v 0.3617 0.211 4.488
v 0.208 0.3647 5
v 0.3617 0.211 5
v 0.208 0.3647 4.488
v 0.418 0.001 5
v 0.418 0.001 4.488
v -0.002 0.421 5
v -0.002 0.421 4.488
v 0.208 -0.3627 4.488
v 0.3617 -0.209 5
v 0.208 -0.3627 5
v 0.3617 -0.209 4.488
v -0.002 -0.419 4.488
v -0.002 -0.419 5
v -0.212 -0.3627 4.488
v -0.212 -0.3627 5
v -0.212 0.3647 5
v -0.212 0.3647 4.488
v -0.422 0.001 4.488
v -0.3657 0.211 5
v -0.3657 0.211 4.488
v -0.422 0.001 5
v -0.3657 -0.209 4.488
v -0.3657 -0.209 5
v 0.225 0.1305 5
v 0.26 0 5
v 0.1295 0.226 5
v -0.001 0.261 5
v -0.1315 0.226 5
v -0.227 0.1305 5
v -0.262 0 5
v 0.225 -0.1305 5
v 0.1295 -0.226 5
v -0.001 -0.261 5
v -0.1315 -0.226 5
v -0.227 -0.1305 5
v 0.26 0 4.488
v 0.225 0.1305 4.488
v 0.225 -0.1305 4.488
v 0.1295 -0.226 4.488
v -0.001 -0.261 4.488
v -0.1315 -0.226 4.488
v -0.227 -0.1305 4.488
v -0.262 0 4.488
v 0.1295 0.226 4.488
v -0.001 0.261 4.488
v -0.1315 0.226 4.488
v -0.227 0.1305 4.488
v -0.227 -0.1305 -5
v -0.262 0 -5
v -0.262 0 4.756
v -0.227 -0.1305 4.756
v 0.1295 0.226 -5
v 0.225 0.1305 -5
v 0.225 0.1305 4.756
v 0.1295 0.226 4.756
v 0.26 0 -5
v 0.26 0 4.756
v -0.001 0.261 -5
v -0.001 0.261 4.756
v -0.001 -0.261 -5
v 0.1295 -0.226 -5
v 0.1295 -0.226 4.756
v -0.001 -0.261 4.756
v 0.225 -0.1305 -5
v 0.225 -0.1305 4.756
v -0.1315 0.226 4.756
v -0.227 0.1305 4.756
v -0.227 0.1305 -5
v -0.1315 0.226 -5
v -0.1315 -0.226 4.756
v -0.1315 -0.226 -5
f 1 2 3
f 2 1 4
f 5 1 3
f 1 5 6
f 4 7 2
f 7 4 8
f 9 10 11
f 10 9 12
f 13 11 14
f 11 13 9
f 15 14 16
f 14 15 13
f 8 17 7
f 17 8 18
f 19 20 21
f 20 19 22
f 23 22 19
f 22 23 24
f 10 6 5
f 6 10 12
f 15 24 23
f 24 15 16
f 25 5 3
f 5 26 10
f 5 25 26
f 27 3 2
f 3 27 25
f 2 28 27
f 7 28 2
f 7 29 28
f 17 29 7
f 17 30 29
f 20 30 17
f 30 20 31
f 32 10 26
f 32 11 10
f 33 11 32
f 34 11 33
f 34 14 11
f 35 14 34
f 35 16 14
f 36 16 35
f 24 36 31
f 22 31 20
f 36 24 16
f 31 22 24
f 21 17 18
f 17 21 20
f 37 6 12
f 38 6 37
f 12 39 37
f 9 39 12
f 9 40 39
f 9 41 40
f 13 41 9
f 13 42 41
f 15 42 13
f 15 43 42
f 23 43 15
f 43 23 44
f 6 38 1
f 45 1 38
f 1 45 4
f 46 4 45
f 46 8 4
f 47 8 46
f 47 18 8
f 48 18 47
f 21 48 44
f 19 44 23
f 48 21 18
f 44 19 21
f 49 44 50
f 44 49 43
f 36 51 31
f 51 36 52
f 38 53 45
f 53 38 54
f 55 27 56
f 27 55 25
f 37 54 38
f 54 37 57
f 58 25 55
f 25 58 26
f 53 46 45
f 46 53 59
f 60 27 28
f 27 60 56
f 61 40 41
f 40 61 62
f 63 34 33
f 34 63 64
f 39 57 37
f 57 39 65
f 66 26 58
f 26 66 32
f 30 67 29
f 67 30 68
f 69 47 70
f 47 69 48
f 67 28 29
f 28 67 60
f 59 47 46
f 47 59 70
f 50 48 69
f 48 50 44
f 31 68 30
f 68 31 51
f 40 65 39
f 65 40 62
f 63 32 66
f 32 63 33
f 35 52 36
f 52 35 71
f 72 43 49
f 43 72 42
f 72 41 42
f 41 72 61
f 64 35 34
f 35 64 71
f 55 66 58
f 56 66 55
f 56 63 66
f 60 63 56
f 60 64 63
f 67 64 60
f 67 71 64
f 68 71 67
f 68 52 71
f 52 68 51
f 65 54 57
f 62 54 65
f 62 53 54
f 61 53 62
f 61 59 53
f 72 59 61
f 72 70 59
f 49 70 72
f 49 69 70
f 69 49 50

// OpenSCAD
intersection() {
    translate([-0.504, -0.504, -6])
        cube(size = [1.008, 1.009, 12], center = false);
    union() {
        difference() {
            translate([-0.002, 0.001, 4.488])
            cylinder(h = 0.512, r1 = 0.42, r2 = 0.42, center = false, $fn = 12);
            translate([-0.001, 0, -18.1])
            cylinder(h = 36.2, r1 = 0.261, r2 = 0.261, center = false, $fn = 12);
        }
        translate([-0.001, 0, -5])
        cylinder(h = 9.756, r1 = 0.261, r2 = 0.261, center = false, $fn = 12);
    }
}
